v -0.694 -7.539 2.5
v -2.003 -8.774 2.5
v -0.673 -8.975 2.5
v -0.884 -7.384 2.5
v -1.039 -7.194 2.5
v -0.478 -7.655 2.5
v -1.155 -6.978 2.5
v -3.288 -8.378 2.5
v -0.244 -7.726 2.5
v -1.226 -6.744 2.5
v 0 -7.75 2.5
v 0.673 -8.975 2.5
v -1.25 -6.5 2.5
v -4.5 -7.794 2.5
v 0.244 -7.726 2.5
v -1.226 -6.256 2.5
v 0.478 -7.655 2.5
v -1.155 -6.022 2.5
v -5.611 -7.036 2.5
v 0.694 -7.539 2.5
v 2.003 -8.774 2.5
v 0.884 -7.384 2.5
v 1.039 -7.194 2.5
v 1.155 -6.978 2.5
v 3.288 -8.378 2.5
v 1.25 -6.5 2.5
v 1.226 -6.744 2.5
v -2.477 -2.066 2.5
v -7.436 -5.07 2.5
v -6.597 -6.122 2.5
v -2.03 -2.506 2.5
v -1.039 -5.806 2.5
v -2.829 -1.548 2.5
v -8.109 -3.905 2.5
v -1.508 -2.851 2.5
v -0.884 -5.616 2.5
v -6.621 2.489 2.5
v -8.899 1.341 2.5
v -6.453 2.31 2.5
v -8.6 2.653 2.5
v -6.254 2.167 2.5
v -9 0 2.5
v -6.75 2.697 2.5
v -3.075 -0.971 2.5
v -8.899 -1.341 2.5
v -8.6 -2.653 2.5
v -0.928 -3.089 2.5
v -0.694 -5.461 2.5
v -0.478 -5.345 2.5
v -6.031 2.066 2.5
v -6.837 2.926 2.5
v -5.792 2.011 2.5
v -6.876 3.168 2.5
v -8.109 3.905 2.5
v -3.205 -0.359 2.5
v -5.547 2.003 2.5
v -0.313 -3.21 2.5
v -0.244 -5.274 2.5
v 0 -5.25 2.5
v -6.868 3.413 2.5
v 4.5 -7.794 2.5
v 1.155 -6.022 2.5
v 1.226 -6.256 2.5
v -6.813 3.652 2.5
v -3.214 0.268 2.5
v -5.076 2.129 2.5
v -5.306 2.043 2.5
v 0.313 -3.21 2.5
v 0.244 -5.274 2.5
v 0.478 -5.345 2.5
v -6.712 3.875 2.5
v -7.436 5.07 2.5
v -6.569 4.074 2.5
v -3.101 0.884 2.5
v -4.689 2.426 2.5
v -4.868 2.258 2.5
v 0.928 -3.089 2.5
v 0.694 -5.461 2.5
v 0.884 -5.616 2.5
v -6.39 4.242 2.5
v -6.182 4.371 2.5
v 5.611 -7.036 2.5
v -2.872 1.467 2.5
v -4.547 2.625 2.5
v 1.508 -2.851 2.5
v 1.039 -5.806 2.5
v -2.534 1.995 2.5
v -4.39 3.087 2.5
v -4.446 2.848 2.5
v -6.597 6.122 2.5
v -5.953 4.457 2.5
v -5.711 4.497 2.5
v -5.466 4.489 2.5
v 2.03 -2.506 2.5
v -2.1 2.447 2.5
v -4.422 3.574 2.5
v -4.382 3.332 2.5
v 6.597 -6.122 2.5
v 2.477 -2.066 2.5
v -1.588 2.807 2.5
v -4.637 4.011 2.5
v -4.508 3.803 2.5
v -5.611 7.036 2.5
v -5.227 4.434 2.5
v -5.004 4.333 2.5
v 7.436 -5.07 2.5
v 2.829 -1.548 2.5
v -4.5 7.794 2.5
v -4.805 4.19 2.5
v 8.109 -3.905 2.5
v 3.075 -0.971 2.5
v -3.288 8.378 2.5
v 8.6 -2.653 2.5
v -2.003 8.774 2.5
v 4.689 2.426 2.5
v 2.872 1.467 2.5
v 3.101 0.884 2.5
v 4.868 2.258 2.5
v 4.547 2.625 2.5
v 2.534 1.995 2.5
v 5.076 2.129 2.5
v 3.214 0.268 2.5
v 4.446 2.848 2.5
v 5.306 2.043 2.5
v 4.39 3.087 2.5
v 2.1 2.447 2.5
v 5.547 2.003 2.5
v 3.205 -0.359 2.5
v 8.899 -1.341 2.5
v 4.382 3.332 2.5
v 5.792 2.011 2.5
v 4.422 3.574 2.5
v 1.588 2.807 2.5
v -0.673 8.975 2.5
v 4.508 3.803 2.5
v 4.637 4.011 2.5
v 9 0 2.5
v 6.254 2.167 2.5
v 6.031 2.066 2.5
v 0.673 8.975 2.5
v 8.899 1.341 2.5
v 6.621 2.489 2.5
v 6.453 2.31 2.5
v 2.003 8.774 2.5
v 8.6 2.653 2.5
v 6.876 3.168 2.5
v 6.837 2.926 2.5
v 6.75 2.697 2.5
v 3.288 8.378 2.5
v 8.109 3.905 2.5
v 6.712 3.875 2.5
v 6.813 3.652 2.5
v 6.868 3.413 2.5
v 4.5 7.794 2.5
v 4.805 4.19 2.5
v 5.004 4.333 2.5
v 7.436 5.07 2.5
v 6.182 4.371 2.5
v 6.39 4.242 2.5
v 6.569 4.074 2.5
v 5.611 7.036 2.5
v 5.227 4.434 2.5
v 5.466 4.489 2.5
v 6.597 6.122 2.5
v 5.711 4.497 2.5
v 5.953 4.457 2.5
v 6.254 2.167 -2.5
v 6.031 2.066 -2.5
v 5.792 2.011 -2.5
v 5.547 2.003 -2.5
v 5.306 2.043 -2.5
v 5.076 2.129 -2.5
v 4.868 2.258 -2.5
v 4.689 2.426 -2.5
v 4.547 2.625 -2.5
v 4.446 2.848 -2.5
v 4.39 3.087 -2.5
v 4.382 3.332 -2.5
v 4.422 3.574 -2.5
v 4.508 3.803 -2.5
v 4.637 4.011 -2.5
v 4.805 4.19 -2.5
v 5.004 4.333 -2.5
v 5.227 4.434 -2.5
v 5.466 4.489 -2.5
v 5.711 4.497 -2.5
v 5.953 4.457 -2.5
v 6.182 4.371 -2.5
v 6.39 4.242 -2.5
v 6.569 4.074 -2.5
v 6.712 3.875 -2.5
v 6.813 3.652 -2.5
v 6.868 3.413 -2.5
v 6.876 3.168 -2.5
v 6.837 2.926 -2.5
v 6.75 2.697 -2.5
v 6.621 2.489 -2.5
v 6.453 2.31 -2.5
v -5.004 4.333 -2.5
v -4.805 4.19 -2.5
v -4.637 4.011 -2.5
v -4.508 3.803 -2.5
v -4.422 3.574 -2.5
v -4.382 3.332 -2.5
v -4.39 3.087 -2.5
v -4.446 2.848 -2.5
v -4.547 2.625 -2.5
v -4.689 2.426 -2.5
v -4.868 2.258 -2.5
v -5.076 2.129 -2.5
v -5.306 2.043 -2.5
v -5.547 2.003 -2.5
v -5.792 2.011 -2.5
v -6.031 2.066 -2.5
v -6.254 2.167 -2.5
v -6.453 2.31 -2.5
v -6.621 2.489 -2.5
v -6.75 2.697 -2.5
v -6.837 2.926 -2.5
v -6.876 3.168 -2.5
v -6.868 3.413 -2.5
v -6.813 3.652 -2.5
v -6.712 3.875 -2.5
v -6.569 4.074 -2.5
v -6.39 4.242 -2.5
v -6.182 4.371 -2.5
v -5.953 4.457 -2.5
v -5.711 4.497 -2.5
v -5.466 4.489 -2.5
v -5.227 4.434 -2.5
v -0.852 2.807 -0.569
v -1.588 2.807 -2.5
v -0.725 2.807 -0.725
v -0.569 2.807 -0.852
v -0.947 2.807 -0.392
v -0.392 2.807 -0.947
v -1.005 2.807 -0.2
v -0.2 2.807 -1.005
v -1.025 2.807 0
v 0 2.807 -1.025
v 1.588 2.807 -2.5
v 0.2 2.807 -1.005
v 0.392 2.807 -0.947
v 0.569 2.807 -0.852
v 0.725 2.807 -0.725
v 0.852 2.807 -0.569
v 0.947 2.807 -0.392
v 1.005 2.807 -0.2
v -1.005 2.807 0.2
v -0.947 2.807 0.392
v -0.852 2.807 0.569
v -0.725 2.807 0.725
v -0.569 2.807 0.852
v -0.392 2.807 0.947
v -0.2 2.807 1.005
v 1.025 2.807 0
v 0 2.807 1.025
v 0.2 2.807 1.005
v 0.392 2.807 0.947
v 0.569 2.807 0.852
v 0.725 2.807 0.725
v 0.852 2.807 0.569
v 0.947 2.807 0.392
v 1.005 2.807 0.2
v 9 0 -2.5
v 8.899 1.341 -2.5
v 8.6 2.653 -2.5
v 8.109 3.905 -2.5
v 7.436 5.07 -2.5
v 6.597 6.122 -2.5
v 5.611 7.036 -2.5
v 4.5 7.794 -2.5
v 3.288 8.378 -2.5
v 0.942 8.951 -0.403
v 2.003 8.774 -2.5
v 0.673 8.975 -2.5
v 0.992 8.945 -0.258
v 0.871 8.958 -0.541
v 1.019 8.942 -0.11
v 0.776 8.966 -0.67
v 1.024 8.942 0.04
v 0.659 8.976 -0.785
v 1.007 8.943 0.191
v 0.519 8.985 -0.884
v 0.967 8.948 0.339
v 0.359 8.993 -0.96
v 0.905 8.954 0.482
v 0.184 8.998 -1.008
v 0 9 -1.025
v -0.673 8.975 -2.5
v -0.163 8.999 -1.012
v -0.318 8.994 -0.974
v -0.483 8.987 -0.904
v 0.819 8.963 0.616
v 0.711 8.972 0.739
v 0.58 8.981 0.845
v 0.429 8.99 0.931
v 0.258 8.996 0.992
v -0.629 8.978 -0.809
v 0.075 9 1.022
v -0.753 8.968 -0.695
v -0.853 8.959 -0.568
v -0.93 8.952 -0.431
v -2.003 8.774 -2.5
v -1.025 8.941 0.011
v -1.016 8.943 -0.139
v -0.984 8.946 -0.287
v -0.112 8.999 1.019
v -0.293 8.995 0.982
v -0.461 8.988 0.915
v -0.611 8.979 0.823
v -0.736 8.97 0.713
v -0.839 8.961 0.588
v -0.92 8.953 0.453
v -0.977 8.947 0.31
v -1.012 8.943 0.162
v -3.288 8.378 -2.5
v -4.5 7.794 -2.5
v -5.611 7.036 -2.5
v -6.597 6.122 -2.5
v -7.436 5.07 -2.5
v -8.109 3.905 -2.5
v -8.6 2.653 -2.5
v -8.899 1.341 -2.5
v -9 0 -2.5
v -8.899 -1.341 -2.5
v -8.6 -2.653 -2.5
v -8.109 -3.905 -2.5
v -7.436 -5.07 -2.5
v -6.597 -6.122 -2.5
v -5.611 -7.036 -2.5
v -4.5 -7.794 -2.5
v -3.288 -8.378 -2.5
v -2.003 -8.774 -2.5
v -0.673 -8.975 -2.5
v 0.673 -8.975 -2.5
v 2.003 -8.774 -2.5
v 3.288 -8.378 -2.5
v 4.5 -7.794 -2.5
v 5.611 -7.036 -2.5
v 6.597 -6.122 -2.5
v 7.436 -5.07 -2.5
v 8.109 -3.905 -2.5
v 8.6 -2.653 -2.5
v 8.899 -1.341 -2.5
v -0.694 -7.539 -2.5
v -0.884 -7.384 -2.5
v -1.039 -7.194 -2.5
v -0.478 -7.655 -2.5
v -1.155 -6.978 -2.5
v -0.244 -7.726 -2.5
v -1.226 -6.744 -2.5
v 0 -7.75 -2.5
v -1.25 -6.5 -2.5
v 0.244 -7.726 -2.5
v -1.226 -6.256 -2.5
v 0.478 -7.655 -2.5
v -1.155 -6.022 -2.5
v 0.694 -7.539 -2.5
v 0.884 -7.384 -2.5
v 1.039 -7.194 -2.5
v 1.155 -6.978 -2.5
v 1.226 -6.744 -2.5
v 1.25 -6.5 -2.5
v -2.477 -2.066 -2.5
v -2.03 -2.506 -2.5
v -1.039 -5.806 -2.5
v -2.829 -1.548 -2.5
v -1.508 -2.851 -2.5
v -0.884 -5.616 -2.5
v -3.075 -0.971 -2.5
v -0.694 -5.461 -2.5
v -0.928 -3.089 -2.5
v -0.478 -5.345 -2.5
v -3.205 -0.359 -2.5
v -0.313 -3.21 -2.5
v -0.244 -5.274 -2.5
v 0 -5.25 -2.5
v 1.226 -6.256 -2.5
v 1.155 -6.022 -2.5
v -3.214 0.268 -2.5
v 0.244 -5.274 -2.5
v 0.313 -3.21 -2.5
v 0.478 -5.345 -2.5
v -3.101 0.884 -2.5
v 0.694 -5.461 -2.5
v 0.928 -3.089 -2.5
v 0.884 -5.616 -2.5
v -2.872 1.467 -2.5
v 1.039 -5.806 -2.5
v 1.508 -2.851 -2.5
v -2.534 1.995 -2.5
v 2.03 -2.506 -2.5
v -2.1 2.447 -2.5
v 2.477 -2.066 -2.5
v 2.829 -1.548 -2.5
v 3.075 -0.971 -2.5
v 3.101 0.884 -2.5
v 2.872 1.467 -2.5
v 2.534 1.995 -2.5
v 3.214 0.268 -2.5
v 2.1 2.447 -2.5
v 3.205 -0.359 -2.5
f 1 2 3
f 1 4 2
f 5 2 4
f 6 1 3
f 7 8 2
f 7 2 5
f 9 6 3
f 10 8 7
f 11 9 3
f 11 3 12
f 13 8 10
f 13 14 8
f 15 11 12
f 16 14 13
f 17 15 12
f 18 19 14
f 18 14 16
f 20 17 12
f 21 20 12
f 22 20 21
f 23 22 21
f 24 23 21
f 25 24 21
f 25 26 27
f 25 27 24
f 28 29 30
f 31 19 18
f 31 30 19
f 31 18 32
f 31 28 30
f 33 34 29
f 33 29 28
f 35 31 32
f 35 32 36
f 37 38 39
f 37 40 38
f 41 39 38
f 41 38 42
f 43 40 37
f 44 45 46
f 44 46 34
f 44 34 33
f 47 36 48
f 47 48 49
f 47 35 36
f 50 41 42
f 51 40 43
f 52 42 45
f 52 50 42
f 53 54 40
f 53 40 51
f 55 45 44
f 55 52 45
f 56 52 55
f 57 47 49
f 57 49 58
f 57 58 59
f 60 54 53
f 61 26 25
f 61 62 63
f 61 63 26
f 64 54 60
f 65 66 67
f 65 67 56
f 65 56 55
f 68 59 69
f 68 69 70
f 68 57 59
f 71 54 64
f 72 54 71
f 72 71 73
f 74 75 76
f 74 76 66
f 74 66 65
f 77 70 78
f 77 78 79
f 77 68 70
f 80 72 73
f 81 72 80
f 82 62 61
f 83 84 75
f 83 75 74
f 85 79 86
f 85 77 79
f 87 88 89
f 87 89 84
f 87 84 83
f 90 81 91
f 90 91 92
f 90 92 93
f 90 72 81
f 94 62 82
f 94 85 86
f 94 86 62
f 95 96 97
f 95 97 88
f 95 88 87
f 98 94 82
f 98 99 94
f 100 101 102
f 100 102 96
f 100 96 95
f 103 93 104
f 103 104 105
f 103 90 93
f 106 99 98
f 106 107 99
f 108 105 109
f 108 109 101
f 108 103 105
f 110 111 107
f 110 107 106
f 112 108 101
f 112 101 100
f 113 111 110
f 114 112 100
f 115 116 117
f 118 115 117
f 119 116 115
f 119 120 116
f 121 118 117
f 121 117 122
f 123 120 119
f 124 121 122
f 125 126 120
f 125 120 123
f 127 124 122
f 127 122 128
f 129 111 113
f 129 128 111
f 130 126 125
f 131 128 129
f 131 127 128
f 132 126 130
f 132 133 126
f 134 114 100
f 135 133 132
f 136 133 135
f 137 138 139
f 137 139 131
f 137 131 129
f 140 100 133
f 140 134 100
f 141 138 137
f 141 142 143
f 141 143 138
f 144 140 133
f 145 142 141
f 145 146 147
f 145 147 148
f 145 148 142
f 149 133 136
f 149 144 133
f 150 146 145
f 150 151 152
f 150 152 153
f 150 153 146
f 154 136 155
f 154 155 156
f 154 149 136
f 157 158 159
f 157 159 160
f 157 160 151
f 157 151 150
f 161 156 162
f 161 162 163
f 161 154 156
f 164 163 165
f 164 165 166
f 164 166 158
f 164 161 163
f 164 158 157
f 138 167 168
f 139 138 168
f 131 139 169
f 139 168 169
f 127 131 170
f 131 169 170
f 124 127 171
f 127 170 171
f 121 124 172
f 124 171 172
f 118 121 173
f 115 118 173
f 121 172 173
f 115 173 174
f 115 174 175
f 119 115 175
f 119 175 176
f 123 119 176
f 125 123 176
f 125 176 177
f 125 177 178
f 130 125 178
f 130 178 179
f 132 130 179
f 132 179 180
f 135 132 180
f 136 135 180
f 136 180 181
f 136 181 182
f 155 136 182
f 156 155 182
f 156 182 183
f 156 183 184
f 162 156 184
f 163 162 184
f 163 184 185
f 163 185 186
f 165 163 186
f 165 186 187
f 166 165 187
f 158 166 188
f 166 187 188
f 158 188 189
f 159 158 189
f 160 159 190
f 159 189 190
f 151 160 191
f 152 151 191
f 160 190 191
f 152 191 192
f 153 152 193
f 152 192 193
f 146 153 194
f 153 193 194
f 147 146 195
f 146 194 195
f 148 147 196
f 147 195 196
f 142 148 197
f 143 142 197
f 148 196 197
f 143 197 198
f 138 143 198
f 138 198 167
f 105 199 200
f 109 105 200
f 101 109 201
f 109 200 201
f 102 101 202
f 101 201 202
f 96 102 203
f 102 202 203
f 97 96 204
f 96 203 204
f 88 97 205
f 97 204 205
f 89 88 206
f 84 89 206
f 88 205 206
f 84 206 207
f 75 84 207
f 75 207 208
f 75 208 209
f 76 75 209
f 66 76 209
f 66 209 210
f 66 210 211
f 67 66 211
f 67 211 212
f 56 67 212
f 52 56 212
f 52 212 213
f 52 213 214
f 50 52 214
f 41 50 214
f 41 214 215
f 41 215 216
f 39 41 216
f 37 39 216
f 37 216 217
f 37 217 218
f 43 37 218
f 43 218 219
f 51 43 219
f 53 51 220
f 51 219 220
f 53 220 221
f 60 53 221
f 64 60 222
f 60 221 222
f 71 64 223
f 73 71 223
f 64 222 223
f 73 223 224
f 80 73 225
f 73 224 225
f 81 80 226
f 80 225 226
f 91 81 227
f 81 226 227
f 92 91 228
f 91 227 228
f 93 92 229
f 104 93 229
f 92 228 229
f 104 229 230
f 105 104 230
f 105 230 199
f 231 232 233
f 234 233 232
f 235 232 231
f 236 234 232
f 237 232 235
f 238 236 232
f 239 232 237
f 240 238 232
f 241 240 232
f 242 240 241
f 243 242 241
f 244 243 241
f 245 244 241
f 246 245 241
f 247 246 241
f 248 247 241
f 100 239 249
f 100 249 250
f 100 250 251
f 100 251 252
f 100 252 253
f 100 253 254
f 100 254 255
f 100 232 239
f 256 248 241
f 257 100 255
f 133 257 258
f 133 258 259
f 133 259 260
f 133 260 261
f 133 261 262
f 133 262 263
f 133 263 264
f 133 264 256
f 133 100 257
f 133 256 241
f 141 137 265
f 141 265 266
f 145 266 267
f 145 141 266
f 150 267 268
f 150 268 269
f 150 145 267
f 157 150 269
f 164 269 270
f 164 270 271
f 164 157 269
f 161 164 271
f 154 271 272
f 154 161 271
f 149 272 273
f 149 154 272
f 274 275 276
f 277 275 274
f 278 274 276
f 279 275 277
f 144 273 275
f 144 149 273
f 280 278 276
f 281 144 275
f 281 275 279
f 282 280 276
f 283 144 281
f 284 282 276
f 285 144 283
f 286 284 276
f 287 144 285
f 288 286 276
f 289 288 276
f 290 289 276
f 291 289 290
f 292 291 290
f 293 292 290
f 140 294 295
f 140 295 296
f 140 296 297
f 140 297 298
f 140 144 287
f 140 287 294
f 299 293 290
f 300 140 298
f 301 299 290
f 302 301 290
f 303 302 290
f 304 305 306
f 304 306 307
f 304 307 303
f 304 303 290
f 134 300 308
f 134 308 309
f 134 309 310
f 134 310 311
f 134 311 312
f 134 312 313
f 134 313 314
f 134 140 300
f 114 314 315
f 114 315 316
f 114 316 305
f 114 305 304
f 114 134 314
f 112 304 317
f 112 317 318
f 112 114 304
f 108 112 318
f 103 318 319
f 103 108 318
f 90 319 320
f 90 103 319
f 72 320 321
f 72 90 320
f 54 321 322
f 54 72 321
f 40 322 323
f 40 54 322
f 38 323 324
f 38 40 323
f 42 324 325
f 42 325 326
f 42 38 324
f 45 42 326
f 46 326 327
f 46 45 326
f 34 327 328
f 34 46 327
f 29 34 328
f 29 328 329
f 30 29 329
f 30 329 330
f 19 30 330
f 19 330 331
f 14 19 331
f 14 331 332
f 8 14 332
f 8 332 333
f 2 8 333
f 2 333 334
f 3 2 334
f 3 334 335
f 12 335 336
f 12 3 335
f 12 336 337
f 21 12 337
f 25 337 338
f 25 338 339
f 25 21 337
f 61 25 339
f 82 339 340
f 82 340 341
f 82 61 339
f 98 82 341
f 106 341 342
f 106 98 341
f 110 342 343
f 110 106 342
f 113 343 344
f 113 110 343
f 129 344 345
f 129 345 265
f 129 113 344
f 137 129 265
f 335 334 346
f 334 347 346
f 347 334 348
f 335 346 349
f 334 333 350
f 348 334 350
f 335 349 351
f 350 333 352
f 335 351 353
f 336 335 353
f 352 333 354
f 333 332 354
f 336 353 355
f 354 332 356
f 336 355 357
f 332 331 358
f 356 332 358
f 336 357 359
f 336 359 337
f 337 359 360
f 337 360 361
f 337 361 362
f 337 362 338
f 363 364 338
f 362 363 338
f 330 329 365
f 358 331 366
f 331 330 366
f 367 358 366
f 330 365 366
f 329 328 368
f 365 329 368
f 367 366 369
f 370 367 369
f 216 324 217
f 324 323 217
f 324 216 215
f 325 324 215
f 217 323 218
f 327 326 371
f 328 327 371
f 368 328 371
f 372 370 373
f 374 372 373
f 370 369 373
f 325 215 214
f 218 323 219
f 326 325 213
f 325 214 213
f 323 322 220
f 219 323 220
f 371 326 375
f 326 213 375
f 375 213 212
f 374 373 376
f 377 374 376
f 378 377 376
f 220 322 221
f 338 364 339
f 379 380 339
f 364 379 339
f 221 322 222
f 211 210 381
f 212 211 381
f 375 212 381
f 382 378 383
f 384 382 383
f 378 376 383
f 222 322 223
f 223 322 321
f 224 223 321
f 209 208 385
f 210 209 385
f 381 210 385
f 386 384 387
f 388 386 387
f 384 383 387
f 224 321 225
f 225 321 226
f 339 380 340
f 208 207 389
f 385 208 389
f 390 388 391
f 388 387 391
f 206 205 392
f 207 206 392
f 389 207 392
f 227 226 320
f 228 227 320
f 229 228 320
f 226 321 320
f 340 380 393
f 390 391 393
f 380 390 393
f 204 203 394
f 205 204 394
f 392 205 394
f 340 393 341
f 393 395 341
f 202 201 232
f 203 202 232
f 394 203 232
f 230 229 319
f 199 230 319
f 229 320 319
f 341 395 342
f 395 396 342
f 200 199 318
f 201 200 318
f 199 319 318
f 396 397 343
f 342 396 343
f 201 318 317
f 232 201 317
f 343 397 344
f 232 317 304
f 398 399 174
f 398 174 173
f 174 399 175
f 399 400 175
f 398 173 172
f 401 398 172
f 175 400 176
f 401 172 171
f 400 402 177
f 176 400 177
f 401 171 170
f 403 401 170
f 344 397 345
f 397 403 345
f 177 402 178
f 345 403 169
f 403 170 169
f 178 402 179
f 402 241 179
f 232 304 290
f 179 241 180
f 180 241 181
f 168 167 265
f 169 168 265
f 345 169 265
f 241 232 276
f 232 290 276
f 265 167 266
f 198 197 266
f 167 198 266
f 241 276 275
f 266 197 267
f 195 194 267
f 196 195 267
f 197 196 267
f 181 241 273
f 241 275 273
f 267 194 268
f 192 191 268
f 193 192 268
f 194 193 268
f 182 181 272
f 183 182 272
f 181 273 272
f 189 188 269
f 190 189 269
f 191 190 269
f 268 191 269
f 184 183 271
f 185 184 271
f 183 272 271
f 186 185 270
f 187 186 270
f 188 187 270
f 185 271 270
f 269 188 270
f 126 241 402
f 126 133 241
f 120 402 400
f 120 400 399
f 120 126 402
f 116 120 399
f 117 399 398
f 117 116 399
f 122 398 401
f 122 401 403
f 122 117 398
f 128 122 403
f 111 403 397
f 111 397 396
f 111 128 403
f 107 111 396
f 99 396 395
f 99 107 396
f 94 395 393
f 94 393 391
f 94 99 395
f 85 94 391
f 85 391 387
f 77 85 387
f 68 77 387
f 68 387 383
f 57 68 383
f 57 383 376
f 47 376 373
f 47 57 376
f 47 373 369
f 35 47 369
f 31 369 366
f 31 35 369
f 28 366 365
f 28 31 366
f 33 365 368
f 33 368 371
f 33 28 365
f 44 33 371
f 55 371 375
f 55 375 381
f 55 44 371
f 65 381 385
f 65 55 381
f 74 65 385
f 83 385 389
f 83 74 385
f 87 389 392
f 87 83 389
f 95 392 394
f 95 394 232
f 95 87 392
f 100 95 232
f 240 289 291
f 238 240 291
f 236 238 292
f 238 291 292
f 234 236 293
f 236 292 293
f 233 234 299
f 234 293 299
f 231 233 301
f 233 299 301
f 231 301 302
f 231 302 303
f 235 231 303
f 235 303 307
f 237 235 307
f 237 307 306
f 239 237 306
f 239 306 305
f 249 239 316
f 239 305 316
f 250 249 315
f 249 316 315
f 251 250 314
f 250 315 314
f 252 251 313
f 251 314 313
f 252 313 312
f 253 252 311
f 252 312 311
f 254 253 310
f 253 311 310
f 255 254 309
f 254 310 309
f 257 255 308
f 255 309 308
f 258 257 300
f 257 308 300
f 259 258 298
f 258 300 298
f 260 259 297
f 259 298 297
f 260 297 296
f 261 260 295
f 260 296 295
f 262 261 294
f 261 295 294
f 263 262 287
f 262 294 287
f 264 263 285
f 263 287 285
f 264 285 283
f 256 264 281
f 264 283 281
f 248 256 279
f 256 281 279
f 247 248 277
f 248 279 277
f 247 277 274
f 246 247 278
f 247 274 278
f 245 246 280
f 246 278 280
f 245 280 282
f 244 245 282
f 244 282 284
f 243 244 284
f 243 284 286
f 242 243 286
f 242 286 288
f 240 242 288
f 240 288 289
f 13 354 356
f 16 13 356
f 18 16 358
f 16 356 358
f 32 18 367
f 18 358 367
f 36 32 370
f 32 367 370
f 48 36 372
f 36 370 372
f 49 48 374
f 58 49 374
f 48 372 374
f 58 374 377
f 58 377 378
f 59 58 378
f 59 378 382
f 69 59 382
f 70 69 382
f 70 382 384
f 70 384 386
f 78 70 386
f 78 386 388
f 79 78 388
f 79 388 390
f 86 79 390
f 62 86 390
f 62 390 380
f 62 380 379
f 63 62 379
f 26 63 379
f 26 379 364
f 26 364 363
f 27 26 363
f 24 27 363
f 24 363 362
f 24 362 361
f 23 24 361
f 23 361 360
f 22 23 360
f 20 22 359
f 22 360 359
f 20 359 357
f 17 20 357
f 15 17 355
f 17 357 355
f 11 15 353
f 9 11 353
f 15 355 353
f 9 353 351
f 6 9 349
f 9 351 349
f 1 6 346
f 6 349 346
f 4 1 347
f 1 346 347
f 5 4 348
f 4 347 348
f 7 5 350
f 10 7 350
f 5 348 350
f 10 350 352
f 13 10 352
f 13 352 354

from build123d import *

# Parameters (mm, degrees)
SKETCH1_R              = 9
BOSS_EXTRUDE1_DEPTH    = 2.5
M2_5_CLEARANCE_HOLE2_D = 2.5
CIRPATTERN1_COUNT      = 3
SKETCH7_W              = 1.025
SKETCH7_H              = 6.192782739


with BuildPart() as part:
    # Sketch1 → Boss-Extrude1 (new body, symmetric)
    with BuildSketch(Plane.XY):
        Circle(SKETCH1_R)
        with BuildLine():
            Line((-1.5875, 2.807217261), (1.5875, 2.807217261))
            ThreePointArc((1.5875, 2.807217261), (0, -3.225), (-1.5875, 2.807217261))
        make_face(mode=Mode.SUBTRACT)
    extrude(amount=BOSS_EXTRUDE1_DEPTH, both=True)

    # M2.5 Clearance Hole2 (through all)
    with Locations(Plane.XY.offset(2.5)):
        with Locations((0, -6.5)):
            m2_5_clearance_hole2 = Hole(M2_5_CLEARANCE_HOLE2_D / 2)

    # CirPattern1: M2.5 Clearance Hole2 ×3 about axis
    cirpattern1_axis = Axis((0, 0, 0), (0, 0, 1))
    for i in range(1, CIRPATTERN1_COUNT):
        add(m2_5_clearance_hole2.rotate(cirpattern1_axis, i * 360 / CIRPATTERN1_COUNT), mode=Mode.SUBTRACT)

    # Sketch7 → M2.5x0.45 Tapped Hole1 (revolve, cut)
    with BuildSketch(Plane(origin=(0, 2.807217261, 0), x_dir=(0, 0, -1), z_dir=(1, 0, 0))):
        with Locations((0.5125, 3.09639137)):
            Rectangle(SKETCH7_W, SKETCH7_H)
    revolve(axis=Axis((0, -3.542782739, 0), (0, 1, 0)), mode=Mode.SUBTRACT)


solid = part.part
